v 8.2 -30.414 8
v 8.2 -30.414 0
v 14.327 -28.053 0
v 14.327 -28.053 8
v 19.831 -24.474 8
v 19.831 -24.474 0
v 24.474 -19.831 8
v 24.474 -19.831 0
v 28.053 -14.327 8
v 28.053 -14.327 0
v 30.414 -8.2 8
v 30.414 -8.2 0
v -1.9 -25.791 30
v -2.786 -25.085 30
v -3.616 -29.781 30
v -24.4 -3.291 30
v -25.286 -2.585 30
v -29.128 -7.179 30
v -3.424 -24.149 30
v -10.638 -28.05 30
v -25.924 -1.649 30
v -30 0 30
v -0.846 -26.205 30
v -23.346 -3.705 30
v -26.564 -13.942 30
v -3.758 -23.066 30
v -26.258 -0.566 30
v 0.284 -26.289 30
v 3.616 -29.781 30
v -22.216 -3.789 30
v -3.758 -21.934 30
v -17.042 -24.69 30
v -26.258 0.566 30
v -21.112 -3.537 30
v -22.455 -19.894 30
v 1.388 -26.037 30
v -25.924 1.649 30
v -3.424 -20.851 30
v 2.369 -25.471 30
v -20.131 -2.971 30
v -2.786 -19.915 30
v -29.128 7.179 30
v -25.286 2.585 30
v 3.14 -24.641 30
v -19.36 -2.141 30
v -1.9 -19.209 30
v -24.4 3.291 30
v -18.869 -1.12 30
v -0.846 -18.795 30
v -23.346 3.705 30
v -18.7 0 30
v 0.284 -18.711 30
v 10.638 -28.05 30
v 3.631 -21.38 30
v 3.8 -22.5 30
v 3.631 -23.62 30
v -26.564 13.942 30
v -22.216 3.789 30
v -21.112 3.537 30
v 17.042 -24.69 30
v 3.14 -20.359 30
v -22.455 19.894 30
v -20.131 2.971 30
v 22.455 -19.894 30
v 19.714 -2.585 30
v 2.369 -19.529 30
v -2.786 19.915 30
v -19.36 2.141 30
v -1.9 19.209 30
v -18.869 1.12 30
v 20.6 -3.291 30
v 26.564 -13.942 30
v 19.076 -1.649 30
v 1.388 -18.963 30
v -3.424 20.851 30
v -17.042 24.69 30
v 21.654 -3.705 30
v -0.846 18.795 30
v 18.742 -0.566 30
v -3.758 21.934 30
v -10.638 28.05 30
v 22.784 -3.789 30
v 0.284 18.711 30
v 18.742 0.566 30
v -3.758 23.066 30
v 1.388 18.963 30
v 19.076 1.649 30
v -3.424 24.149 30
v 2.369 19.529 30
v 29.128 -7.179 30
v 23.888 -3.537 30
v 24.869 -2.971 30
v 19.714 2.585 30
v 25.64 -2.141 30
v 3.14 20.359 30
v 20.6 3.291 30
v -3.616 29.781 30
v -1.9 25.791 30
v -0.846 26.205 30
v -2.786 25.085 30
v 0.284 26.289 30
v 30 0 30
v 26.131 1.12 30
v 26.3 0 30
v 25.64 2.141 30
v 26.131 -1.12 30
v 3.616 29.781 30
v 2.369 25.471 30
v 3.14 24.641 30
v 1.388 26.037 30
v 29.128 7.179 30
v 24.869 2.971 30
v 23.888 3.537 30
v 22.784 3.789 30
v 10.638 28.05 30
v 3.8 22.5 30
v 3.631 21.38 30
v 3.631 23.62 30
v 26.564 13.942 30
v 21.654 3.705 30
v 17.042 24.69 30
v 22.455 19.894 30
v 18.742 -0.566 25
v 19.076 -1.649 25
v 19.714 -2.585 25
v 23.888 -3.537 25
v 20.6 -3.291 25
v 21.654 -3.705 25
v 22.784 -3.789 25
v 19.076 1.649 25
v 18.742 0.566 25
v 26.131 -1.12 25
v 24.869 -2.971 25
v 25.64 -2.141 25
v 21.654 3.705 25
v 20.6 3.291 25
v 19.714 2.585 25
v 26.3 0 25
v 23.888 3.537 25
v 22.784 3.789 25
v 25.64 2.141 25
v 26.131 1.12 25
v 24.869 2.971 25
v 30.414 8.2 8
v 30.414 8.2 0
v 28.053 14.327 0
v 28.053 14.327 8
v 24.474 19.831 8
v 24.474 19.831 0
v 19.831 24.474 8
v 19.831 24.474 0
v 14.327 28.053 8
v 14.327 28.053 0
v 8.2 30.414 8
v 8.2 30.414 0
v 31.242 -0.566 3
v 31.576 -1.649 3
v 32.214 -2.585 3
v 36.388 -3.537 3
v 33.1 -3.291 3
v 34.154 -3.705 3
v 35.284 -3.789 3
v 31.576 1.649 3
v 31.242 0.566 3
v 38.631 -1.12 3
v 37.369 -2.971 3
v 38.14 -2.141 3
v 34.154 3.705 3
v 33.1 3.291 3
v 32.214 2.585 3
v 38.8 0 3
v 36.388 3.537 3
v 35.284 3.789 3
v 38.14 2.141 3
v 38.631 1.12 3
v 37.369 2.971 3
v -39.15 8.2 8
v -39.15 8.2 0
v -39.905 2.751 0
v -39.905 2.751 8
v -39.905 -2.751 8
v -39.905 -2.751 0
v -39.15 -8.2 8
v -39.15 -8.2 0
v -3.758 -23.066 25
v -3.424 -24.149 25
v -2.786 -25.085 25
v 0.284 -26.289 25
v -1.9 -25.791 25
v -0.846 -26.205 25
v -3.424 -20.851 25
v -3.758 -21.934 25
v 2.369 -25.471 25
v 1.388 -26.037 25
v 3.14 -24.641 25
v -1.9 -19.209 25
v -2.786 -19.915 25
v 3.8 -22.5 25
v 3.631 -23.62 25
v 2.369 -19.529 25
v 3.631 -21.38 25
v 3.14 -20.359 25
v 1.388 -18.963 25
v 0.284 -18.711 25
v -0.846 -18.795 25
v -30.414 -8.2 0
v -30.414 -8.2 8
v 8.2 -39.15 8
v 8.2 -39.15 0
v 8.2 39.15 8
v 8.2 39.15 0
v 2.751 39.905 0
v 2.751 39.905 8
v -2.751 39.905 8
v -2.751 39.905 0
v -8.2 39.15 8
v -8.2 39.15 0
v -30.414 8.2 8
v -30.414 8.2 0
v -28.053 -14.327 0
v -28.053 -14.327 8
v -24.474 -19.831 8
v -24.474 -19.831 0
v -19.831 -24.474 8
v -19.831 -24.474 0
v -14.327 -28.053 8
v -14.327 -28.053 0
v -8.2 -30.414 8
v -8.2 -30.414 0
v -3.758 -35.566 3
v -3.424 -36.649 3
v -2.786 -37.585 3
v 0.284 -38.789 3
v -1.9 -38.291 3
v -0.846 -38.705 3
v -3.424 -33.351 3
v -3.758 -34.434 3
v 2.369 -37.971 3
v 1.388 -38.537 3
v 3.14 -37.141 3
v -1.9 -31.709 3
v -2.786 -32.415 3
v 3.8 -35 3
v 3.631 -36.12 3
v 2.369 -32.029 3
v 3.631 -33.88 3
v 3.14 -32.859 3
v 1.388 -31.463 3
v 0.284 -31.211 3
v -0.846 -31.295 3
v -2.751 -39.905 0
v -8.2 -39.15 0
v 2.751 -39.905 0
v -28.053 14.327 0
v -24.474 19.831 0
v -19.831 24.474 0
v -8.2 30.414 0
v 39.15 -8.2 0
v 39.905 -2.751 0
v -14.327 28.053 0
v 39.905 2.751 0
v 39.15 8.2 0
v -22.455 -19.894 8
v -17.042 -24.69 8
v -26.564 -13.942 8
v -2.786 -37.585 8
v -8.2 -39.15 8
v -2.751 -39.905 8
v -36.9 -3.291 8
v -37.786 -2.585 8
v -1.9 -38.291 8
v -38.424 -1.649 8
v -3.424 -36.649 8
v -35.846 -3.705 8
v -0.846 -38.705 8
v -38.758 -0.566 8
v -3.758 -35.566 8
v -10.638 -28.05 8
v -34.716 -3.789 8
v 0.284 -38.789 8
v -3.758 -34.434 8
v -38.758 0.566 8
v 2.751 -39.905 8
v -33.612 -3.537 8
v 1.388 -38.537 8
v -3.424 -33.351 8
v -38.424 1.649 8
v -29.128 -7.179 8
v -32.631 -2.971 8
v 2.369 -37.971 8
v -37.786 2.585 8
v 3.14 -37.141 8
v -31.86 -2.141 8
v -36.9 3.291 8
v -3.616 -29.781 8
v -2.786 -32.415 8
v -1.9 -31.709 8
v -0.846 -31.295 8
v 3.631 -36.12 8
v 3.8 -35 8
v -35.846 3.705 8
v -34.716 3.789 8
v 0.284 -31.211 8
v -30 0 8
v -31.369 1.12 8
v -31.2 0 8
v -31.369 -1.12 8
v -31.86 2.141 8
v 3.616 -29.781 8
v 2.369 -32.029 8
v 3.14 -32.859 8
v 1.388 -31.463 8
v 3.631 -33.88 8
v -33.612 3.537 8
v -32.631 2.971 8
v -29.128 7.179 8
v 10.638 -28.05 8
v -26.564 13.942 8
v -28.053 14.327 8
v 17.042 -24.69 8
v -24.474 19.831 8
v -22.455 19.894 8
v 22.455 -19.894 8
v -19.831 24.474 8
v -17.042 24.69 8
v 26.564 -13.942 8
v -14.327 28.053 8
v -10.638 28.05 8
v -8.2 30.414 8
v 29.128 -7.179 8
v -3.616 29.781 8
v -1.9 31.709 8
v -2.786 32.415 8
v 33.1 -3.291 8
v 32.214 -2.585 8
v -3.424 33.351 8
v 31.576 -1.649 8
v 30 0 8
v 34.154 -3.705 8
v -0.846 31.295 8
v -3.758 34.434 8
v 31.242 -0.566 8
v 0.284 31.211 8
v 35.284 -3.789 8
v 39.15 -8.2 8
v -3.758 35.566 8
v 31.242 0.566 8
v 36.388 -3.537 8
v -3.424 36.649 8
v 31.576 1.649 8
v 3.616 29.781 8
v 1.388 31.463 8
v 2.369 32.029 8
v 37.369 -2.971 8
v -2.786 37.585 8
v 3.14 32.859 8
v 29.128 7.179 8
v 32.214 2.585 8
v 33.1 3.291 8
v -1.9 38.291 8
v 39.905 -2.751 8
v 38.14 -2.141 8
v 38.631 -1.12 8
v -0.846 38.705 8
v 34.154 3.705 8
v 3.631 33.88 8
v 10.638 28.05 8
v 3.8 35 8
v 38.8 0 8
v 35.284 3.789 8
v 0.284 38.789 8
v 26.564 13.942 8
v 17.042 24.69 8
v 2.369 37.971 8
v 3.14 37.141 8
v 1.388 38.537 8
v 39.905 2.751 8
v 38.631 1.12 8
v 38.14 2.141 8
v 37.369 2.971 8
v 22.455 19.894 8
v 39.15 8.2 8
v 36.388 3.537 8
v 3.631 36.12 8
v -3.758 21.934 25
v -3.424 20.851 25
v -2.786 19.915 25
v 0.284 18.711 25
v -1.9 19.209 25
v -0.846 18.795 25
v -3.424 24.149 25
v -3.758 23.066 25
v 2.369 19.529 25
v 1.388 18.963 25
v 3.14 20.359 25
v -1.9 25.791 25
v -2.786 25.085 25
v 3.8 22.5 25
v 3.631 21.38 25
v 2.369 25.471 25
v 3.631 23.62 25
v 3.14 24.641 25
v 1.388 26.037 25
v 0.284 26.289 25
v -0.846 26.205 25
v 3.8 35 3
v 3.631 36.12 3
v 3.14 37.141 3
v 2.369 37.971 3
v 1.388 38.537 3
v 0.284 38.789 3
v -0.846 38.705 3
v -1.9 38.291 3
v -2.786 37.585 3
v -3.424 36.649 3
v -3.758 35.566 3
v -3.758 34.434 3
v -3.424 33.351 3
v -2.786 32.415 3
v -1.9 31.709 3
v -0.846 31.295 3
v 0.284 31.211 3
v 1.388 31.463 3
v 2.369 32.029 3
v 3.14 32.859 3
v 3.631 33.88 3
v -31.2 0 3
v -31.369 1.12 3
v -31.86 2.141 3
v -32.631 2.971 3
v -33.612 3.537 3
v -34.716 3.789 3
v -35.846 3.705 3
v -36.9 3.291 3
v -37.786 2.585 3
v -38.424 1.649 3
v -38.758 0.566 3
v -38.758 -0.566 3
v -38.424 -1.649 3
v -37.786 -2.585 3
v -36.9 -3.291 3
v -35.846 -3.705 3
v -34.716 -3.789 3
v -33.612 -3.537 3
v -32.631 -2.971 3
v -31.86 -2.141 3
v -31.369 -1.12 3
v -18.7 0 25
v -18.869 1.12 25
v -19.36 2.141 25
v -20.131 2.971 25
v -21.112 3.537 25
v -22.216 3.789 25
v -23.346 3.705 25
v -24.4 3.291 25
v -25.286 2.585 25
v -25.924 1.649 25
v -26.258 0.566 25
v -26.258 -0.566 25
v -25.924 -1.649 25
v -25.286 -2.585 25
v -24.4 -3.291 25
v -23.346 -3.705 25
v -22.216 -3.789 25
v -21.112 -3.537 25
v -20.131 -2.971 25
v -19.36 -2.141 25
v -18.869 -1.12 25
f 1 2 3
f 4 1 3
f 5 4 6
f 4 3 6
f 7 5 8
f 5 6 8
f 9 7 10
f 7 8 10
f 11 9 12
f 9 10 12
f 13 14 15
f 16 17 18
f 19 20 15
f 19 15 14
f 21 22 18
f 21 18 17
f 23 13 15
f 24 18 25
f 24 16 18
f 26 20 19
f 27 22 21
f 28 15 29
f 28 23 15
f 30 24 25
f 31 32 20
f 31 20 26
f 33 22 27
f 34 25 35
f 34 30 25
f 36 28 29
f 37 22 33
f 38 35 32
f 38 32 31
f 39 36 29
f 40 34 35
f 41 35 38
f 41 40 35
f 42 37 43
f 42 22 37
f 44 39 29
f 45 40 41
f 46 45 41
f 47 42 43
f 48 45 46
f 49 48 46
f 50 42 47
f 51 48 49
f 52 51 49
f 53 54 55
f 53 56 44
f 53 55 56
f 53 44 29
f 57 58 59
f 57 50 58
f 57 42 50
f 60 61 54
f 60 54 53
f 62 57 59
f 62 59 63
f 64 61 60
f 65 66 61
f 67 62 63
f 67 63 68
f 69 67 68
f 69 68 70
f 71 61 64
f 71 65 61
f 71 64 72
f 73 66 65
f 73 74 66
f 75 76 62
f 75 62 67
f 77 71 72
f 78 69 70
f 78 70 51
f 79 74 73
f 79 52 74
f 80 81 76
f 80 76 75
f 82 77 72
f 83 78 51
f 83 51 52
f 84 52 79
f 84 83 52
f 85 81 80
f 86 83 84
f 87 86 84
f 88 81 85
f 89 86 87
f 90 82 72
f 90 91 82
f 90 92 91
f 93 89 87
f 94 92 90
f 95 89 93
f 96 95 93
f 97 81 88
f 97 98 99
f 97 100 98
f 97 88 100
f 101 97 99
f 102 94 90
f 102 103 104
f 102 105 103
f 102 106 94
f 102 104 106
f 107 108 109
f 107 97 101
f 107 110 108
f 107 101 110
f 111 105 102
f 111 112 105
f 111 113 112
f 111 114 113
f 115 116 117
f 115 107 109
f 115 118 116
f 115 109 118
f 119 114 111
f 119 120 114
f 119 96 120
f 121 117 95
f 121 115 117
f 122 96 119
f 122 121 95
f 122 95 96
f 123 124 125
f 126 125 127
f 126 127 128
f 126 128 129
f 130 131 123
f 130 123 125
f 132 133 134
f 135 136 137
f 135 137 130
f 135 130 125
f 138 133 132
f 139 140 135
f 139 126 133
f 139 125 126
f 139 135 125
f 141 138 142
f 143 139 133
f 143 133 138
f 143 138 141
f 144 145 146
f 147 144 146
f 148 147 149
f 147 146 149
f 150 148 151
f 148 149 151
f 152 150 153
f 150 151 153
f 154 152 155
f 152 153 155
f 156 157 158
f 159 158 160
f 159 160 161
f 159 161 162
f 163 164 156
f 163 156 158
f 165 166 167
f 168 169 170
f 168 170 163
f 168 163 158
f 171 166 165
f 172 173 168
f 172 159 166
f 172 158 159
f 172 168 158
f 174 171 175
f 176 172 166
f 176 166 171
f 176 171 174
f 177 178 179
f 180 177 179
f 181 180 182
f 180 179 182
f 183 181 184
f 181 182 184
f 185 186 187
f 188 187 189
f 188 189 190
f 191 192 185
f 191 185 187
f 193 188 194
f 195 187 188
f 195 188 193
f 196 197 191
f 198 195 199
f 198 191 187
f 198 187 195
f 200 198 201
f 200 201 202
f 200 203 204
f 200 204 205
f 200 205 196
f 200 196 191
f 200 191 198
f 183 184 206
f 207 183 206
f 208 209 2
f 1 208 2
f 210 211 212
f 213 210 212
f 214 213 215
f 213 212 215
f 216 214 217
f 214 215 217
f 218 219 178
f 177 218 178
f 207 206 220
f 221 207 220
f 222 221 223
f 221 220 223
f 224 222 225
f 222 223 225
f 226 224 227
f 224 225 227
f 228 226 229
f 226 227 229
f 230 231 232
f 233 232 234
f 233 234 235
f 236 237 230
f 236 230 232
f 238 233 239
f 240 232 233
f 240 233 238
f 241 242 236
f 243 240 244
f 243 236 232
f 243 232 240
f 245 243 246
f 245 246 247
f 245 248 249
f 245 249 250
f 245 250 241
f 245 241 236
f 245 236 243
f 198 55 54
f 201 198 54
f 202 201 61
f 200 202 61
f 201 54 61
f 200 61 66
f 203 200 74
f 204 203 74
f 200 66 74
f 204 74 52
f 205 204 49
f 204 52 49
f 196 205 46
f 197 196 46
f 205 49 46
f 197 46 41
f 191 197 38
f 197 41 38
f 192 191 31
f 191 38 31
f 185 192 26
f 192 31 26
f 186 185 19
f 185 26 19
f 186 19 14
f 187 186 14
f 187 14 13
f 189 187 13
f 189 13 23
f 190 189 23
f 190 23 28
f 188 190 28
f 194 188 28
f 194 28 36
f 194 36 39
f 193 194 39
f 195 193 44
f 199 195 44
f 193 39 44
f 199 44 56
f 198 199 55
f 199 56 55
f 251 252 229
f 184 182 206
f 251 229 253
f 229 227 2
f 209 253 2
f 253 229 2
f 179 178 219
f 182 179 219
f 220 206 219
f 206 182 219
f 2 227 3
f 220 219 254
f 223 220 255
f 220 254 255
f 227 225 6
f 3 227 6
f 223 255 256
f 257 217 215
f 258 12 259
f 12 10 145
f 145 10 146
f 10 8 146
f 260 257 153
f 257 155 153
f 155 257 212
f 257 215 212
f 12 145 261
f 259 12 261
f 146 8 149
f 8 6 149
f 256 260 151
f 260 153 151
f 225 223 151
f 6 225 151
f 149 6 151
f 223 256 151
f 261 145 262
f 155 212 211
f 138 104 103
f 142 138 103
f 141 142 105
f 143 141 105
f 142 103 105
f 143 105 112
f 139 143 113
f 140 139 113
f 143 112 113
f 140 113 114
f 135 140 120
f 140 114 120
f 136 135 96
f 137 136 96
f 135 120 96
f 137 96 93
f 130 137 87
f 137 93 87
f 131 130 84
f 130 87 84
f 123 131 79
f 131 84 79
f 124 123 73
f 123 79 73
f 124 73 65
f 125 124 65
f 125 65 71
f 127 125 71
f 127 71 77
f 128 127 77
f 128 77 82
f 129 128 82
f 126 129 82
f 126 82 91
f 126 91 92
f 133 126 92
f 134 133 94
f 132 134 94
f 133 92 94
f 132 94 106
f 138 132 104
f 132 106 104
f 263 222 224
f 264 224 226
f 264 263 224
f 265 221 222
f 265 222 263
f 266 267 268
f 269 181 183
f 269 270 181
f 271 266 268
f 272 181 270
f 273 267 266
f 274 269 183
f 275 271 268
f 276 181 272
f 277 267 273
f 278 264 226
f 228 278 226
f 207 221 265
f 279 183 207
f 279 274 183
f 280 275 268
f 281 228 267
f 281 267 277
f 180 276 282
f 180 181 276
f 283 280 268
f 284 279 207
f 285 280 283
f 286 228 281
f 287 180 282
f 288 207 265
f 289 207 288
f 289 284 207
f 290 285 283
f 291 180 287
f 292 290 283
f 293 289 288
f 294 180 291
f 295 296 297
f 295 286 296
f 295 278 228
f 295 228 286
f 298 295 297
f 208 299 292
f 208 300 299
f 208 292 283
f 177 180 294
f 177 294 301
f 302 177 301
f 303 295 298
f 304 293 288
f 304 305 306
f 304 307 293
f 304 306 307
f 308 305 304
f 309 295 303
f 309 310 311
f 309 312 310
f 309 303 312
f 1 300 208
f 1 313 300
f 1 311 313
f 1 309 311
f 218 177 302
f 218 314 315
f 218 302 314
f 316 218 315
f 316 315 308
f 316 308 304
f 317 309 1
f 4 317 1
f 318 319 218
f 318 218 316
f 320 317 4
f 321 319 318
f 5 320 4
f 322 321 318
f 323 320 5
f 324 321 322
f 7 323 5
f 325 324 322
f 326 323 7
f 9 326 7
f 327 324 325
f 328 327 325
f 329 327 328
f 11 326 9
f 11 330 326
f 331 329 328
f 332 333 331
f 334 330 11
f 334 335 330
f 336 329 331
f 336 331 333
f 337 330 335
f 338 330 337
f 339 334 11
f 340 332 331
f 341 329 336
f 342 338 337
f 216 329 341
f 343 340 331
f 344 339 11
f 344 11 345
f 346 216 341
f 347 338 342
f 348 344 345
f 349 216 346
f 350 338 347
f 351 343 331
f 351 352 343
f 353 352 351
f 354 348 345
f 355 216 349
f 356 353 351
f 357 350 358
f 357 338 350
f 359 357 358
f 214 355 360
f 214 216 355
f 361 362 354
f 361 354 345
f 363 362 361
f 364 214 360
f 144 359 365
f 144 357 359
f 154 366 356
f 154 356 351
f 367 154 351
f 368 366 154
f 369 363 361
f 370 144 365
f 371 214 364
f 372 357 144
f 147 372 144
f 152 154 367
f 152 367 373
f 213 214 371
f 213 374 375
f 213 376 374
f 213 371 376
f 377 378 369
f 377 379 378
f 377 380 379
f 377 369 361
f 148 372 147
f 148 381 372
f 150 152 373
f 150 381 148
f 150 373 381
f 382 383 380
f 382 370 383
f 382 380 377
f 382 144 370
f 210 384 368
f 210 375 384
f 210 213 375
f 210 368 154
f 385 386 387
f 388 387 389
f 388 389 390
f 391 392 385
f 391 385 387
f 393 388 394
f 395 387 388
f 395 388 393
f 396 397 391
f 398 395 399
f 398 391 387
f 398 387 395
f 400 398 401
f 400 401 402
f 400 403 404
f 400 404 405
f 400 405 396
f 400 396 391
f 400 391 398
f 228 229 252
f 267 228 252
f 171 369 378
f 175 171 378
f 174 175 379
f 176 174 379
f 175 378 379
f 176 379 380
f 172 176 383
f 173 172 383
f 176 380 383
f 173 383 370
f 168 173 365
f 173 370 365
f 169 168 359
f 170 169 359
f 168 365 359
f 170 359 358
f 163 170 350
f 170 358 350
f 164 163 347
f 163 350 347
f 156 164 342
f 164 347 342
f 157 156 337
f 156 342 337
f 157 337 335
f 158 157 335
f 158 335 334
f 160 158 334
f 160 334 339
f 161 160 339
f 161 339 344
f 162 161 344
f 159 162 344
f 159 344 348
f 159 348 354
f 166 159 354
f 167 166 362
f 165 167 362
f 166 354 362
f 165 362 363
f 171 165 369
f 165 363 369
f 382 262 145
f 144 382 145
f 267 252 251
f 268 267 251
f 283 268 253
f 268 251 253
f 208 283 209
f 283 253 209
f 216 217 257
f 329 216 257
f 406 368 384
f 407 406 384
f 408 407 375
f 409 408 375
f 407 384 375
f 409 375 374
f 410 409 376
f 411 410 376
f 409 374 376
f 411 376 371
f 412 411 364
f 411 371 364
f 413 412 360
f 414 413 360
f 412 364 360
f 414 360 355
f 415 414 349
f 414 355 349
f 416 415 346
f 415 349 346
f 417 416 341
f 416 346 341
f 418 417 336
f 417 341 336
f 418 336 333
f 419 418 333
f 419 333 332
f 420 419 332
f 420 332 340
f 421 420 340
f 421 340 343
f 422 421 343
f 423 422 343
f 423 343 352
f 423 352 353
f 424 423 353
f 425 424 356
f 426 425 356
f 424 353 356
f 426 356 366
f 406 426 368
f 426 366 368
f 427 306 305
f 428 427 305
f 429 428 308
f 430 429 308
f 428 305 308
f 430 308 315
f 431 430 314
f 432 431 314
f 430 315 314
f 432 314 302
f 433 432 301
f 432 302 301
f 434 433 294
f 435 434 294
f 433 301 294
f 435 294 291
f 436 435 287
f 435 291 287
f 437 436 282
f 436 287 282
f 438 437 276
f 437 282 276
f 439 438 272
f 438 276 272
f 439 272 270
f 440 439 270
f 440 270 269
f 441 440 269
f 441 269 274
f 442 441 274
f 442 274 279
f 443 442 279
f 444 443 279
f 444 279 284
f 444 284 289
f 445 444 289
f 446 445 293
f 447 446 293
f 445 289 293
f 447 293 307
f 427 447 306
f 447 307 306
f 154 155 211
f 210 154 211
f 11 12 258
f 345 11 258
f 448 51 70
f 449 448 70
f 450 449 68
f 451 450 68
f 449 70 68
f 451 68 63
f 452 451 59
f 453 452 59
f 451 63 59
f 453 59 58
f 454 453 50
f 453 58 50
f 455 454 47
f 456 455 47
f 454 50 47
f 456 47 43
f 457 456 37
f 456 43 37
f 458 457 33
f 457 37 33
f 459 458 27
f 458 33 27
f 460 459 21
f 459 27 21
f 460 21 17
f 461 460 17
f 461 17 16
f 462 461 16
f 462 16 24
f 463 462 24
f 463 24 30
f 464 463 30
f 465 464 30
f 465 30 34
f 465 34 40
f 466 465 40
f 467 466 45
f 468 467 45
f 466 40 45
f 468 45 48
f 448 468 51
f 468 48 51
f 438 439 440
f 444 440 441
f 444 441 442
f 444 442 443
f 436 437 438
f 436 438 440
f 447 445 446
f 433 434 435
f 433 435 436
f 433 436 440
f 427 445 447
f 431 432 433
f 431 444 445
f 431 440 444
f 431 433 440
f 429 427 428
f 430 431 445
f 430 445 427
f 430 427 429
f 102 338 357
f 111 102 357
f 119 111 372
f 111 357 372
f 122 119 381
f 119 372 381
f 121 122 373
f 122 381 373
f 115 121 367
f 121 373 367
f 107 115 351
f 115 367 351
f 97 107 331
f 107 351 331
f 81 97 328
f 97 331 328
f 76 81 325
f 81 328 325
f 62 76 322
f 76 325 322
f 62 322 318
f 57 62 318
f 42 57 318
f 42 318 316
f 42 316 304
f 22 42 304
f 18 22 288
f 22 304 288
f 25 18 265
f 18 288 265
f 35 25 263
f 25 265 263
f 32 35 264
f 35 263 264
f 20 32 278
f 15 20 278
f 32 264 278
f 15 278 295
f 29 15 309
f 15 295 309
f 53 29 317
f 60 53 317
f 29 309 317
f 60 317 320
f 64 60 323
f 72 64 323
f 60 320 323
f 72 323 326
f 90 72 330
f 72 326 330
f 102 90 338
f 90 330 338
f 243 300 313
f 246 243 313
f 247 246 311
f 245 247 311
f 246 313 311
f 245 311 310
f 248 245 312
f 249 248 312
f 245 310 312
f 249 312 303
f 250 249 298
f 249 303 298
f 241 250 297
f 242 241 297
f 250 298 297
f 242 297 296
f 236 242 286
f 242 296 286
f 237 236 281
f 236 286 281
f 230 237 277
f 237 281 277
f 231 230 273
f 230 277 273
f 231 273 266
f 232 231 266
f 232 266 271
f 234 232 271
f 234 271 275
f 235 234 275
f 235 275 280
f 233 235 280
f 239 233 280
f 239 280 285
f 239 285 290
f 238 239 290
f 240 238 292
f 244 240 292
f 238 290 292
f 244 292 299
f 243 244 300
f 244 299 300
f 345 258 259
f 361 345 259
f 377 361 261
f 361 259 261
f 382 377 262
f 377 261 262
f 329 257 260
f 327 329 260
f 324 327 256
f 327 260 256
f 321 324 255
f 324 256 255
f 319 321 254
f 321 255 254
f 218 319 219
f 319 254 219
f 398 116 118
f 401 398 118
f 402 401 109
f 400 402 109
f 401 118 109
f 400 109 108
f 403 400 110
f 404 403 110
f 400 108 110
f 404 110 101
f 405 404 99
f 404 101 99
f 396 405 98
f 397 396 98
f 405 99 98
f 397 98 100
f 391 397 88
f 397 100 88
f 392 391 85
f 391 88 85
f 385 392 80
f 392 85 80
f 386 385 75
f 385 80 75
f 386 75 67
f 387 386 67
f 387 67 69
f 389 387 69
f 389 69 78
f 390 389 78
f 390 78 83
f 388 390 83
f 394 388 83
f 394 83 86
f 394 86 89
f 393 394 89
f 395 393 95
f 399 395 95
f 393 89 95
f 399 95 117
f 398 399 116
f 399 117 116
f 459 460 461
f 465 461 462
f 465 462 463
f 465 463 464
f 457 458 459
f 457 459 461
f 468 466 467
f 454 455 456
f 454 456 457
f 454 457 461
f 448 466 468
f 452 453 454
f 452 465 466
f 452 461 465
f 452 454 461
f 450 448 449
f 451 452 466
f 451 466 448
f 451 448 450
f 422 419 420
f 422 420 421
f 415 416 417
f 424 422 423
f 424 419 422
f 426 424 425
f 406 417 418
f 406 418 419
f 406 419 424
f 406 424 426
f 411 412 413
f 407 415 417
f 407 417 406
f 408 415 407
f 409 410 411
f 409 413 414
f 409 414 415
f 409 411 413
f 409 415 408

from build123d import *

# Parameters (mm, degrees)
BOSS_EXTRUDE1_DEPTH = 8
SKETCH2_R           = 30
BOSS_EXTRUDE2_DEPTH = 22
SKETCH3_R           = 3.8
CUT_EXTRUDE1_DEPTH  = 5
SKETCH4_R           = 3.8
CUT_EXTRUDE2_DEPTH  = 5


with BuildPart() as part:
    # Sketch1 → Boss-Extrude1 (new body)
    with BuildSketch(Plane.XY):
        with BuildLine():
            Line((-8.2, 39.150478924), (-8.2, 30.41397705))
            ThreePointArc((-8.2, 30.41397705), (-22.273863607, 22.273863607), (-30.41397705, 8.2))
            Line((-30.41397705, 8.2), (-39.150478924, 8.2))
            ThreePointArc((-39.150478924, 8.2), (-40, 0), (-39.150478924, -8.2))
            Line((-39.150478924, -8.2), (-30.41397705, -8.2))
            ThreePointArc((-30.41397705, -8.2), (-22.273863607, -22.273863607), (-8.2, -30.41397705))
            Line((-8.2, -30.41397705), (-8.2, -39.150478924))
            ThreePointArc((-8.2, -39.150478924), (0, -40), (8.2, -39.150478924))
            Line((8.2, -39.150478924), (8.2, -30.41397705))
            ThreePointArc((8.2, -30.41397705), (22.273863607, -22.273863607), (30.41397705, -8.2))
            Line((30.41397705, -8.2), (39.150478924, -8.2))
            ThreePointArc((39.150478924, -8.2), (40, 0), (39.150478924, 8.2))
            Line((39.150478924, 8.2), (30.41397705, 8.2))
            ThreePointArc((30.41397705, 8.2), (22.273863607, 22.273863607), (8.2, 30.41397705))
            Line((8.2, 30.41397705), (8.2, 39.150478924))
            ThreePointArc((8.2, 39.150478924), (0, 40), (-8.2, 39.150478924))
        make_face()
    extrude(amount=BOSS_EXTRUDE1_DEPTH)

    # Sketch2 → Boss-Extrude2 (add)
    with BuildSketch(Plane.XY.offset(8)):
        Circle(SKETCH2_R)
    extrude(amount=BOSS_EXTRUDE2_DEPTH)

    # Sketch3 → Cut-Extrude1 (cut)
    with BuildSketch(Plane.XY.offset(8)):
        with Locations((0, 35)):
            Circle(SKETCH3_R)
        with Locations((35, 0)):
            Circle(SKETCH3_R)
        with Locations((0, -35)):
            Circle(SKETCH3_R)
        with Locations((-35, 0)):
            Circle(SKETCH3_R)
    extrude(amount=-CUT_EXTRUDE1_DEPTH, mode=Mode.SUBTRACT)

    # Sketch4 → Cut-Extrude2 (cut)
    with BuildSketch(Plane.XY.offset(30)):
        with Locations((0, 22.5)):
            Circle(SKETCH4_R)
        with Locations((22.5, 0)):
            Circle(SKETCH4_R)
        with Locations((0, -22.5)):
            Circle(SKETCH4_R)
        with Locations((-22.5, 0)):
            Circle(SKETCH4_R)
    extrude(amount=-CUT_EXTRUDE2_DEPTH, mode=Mode.SUBTRACT)


solid = part.part
